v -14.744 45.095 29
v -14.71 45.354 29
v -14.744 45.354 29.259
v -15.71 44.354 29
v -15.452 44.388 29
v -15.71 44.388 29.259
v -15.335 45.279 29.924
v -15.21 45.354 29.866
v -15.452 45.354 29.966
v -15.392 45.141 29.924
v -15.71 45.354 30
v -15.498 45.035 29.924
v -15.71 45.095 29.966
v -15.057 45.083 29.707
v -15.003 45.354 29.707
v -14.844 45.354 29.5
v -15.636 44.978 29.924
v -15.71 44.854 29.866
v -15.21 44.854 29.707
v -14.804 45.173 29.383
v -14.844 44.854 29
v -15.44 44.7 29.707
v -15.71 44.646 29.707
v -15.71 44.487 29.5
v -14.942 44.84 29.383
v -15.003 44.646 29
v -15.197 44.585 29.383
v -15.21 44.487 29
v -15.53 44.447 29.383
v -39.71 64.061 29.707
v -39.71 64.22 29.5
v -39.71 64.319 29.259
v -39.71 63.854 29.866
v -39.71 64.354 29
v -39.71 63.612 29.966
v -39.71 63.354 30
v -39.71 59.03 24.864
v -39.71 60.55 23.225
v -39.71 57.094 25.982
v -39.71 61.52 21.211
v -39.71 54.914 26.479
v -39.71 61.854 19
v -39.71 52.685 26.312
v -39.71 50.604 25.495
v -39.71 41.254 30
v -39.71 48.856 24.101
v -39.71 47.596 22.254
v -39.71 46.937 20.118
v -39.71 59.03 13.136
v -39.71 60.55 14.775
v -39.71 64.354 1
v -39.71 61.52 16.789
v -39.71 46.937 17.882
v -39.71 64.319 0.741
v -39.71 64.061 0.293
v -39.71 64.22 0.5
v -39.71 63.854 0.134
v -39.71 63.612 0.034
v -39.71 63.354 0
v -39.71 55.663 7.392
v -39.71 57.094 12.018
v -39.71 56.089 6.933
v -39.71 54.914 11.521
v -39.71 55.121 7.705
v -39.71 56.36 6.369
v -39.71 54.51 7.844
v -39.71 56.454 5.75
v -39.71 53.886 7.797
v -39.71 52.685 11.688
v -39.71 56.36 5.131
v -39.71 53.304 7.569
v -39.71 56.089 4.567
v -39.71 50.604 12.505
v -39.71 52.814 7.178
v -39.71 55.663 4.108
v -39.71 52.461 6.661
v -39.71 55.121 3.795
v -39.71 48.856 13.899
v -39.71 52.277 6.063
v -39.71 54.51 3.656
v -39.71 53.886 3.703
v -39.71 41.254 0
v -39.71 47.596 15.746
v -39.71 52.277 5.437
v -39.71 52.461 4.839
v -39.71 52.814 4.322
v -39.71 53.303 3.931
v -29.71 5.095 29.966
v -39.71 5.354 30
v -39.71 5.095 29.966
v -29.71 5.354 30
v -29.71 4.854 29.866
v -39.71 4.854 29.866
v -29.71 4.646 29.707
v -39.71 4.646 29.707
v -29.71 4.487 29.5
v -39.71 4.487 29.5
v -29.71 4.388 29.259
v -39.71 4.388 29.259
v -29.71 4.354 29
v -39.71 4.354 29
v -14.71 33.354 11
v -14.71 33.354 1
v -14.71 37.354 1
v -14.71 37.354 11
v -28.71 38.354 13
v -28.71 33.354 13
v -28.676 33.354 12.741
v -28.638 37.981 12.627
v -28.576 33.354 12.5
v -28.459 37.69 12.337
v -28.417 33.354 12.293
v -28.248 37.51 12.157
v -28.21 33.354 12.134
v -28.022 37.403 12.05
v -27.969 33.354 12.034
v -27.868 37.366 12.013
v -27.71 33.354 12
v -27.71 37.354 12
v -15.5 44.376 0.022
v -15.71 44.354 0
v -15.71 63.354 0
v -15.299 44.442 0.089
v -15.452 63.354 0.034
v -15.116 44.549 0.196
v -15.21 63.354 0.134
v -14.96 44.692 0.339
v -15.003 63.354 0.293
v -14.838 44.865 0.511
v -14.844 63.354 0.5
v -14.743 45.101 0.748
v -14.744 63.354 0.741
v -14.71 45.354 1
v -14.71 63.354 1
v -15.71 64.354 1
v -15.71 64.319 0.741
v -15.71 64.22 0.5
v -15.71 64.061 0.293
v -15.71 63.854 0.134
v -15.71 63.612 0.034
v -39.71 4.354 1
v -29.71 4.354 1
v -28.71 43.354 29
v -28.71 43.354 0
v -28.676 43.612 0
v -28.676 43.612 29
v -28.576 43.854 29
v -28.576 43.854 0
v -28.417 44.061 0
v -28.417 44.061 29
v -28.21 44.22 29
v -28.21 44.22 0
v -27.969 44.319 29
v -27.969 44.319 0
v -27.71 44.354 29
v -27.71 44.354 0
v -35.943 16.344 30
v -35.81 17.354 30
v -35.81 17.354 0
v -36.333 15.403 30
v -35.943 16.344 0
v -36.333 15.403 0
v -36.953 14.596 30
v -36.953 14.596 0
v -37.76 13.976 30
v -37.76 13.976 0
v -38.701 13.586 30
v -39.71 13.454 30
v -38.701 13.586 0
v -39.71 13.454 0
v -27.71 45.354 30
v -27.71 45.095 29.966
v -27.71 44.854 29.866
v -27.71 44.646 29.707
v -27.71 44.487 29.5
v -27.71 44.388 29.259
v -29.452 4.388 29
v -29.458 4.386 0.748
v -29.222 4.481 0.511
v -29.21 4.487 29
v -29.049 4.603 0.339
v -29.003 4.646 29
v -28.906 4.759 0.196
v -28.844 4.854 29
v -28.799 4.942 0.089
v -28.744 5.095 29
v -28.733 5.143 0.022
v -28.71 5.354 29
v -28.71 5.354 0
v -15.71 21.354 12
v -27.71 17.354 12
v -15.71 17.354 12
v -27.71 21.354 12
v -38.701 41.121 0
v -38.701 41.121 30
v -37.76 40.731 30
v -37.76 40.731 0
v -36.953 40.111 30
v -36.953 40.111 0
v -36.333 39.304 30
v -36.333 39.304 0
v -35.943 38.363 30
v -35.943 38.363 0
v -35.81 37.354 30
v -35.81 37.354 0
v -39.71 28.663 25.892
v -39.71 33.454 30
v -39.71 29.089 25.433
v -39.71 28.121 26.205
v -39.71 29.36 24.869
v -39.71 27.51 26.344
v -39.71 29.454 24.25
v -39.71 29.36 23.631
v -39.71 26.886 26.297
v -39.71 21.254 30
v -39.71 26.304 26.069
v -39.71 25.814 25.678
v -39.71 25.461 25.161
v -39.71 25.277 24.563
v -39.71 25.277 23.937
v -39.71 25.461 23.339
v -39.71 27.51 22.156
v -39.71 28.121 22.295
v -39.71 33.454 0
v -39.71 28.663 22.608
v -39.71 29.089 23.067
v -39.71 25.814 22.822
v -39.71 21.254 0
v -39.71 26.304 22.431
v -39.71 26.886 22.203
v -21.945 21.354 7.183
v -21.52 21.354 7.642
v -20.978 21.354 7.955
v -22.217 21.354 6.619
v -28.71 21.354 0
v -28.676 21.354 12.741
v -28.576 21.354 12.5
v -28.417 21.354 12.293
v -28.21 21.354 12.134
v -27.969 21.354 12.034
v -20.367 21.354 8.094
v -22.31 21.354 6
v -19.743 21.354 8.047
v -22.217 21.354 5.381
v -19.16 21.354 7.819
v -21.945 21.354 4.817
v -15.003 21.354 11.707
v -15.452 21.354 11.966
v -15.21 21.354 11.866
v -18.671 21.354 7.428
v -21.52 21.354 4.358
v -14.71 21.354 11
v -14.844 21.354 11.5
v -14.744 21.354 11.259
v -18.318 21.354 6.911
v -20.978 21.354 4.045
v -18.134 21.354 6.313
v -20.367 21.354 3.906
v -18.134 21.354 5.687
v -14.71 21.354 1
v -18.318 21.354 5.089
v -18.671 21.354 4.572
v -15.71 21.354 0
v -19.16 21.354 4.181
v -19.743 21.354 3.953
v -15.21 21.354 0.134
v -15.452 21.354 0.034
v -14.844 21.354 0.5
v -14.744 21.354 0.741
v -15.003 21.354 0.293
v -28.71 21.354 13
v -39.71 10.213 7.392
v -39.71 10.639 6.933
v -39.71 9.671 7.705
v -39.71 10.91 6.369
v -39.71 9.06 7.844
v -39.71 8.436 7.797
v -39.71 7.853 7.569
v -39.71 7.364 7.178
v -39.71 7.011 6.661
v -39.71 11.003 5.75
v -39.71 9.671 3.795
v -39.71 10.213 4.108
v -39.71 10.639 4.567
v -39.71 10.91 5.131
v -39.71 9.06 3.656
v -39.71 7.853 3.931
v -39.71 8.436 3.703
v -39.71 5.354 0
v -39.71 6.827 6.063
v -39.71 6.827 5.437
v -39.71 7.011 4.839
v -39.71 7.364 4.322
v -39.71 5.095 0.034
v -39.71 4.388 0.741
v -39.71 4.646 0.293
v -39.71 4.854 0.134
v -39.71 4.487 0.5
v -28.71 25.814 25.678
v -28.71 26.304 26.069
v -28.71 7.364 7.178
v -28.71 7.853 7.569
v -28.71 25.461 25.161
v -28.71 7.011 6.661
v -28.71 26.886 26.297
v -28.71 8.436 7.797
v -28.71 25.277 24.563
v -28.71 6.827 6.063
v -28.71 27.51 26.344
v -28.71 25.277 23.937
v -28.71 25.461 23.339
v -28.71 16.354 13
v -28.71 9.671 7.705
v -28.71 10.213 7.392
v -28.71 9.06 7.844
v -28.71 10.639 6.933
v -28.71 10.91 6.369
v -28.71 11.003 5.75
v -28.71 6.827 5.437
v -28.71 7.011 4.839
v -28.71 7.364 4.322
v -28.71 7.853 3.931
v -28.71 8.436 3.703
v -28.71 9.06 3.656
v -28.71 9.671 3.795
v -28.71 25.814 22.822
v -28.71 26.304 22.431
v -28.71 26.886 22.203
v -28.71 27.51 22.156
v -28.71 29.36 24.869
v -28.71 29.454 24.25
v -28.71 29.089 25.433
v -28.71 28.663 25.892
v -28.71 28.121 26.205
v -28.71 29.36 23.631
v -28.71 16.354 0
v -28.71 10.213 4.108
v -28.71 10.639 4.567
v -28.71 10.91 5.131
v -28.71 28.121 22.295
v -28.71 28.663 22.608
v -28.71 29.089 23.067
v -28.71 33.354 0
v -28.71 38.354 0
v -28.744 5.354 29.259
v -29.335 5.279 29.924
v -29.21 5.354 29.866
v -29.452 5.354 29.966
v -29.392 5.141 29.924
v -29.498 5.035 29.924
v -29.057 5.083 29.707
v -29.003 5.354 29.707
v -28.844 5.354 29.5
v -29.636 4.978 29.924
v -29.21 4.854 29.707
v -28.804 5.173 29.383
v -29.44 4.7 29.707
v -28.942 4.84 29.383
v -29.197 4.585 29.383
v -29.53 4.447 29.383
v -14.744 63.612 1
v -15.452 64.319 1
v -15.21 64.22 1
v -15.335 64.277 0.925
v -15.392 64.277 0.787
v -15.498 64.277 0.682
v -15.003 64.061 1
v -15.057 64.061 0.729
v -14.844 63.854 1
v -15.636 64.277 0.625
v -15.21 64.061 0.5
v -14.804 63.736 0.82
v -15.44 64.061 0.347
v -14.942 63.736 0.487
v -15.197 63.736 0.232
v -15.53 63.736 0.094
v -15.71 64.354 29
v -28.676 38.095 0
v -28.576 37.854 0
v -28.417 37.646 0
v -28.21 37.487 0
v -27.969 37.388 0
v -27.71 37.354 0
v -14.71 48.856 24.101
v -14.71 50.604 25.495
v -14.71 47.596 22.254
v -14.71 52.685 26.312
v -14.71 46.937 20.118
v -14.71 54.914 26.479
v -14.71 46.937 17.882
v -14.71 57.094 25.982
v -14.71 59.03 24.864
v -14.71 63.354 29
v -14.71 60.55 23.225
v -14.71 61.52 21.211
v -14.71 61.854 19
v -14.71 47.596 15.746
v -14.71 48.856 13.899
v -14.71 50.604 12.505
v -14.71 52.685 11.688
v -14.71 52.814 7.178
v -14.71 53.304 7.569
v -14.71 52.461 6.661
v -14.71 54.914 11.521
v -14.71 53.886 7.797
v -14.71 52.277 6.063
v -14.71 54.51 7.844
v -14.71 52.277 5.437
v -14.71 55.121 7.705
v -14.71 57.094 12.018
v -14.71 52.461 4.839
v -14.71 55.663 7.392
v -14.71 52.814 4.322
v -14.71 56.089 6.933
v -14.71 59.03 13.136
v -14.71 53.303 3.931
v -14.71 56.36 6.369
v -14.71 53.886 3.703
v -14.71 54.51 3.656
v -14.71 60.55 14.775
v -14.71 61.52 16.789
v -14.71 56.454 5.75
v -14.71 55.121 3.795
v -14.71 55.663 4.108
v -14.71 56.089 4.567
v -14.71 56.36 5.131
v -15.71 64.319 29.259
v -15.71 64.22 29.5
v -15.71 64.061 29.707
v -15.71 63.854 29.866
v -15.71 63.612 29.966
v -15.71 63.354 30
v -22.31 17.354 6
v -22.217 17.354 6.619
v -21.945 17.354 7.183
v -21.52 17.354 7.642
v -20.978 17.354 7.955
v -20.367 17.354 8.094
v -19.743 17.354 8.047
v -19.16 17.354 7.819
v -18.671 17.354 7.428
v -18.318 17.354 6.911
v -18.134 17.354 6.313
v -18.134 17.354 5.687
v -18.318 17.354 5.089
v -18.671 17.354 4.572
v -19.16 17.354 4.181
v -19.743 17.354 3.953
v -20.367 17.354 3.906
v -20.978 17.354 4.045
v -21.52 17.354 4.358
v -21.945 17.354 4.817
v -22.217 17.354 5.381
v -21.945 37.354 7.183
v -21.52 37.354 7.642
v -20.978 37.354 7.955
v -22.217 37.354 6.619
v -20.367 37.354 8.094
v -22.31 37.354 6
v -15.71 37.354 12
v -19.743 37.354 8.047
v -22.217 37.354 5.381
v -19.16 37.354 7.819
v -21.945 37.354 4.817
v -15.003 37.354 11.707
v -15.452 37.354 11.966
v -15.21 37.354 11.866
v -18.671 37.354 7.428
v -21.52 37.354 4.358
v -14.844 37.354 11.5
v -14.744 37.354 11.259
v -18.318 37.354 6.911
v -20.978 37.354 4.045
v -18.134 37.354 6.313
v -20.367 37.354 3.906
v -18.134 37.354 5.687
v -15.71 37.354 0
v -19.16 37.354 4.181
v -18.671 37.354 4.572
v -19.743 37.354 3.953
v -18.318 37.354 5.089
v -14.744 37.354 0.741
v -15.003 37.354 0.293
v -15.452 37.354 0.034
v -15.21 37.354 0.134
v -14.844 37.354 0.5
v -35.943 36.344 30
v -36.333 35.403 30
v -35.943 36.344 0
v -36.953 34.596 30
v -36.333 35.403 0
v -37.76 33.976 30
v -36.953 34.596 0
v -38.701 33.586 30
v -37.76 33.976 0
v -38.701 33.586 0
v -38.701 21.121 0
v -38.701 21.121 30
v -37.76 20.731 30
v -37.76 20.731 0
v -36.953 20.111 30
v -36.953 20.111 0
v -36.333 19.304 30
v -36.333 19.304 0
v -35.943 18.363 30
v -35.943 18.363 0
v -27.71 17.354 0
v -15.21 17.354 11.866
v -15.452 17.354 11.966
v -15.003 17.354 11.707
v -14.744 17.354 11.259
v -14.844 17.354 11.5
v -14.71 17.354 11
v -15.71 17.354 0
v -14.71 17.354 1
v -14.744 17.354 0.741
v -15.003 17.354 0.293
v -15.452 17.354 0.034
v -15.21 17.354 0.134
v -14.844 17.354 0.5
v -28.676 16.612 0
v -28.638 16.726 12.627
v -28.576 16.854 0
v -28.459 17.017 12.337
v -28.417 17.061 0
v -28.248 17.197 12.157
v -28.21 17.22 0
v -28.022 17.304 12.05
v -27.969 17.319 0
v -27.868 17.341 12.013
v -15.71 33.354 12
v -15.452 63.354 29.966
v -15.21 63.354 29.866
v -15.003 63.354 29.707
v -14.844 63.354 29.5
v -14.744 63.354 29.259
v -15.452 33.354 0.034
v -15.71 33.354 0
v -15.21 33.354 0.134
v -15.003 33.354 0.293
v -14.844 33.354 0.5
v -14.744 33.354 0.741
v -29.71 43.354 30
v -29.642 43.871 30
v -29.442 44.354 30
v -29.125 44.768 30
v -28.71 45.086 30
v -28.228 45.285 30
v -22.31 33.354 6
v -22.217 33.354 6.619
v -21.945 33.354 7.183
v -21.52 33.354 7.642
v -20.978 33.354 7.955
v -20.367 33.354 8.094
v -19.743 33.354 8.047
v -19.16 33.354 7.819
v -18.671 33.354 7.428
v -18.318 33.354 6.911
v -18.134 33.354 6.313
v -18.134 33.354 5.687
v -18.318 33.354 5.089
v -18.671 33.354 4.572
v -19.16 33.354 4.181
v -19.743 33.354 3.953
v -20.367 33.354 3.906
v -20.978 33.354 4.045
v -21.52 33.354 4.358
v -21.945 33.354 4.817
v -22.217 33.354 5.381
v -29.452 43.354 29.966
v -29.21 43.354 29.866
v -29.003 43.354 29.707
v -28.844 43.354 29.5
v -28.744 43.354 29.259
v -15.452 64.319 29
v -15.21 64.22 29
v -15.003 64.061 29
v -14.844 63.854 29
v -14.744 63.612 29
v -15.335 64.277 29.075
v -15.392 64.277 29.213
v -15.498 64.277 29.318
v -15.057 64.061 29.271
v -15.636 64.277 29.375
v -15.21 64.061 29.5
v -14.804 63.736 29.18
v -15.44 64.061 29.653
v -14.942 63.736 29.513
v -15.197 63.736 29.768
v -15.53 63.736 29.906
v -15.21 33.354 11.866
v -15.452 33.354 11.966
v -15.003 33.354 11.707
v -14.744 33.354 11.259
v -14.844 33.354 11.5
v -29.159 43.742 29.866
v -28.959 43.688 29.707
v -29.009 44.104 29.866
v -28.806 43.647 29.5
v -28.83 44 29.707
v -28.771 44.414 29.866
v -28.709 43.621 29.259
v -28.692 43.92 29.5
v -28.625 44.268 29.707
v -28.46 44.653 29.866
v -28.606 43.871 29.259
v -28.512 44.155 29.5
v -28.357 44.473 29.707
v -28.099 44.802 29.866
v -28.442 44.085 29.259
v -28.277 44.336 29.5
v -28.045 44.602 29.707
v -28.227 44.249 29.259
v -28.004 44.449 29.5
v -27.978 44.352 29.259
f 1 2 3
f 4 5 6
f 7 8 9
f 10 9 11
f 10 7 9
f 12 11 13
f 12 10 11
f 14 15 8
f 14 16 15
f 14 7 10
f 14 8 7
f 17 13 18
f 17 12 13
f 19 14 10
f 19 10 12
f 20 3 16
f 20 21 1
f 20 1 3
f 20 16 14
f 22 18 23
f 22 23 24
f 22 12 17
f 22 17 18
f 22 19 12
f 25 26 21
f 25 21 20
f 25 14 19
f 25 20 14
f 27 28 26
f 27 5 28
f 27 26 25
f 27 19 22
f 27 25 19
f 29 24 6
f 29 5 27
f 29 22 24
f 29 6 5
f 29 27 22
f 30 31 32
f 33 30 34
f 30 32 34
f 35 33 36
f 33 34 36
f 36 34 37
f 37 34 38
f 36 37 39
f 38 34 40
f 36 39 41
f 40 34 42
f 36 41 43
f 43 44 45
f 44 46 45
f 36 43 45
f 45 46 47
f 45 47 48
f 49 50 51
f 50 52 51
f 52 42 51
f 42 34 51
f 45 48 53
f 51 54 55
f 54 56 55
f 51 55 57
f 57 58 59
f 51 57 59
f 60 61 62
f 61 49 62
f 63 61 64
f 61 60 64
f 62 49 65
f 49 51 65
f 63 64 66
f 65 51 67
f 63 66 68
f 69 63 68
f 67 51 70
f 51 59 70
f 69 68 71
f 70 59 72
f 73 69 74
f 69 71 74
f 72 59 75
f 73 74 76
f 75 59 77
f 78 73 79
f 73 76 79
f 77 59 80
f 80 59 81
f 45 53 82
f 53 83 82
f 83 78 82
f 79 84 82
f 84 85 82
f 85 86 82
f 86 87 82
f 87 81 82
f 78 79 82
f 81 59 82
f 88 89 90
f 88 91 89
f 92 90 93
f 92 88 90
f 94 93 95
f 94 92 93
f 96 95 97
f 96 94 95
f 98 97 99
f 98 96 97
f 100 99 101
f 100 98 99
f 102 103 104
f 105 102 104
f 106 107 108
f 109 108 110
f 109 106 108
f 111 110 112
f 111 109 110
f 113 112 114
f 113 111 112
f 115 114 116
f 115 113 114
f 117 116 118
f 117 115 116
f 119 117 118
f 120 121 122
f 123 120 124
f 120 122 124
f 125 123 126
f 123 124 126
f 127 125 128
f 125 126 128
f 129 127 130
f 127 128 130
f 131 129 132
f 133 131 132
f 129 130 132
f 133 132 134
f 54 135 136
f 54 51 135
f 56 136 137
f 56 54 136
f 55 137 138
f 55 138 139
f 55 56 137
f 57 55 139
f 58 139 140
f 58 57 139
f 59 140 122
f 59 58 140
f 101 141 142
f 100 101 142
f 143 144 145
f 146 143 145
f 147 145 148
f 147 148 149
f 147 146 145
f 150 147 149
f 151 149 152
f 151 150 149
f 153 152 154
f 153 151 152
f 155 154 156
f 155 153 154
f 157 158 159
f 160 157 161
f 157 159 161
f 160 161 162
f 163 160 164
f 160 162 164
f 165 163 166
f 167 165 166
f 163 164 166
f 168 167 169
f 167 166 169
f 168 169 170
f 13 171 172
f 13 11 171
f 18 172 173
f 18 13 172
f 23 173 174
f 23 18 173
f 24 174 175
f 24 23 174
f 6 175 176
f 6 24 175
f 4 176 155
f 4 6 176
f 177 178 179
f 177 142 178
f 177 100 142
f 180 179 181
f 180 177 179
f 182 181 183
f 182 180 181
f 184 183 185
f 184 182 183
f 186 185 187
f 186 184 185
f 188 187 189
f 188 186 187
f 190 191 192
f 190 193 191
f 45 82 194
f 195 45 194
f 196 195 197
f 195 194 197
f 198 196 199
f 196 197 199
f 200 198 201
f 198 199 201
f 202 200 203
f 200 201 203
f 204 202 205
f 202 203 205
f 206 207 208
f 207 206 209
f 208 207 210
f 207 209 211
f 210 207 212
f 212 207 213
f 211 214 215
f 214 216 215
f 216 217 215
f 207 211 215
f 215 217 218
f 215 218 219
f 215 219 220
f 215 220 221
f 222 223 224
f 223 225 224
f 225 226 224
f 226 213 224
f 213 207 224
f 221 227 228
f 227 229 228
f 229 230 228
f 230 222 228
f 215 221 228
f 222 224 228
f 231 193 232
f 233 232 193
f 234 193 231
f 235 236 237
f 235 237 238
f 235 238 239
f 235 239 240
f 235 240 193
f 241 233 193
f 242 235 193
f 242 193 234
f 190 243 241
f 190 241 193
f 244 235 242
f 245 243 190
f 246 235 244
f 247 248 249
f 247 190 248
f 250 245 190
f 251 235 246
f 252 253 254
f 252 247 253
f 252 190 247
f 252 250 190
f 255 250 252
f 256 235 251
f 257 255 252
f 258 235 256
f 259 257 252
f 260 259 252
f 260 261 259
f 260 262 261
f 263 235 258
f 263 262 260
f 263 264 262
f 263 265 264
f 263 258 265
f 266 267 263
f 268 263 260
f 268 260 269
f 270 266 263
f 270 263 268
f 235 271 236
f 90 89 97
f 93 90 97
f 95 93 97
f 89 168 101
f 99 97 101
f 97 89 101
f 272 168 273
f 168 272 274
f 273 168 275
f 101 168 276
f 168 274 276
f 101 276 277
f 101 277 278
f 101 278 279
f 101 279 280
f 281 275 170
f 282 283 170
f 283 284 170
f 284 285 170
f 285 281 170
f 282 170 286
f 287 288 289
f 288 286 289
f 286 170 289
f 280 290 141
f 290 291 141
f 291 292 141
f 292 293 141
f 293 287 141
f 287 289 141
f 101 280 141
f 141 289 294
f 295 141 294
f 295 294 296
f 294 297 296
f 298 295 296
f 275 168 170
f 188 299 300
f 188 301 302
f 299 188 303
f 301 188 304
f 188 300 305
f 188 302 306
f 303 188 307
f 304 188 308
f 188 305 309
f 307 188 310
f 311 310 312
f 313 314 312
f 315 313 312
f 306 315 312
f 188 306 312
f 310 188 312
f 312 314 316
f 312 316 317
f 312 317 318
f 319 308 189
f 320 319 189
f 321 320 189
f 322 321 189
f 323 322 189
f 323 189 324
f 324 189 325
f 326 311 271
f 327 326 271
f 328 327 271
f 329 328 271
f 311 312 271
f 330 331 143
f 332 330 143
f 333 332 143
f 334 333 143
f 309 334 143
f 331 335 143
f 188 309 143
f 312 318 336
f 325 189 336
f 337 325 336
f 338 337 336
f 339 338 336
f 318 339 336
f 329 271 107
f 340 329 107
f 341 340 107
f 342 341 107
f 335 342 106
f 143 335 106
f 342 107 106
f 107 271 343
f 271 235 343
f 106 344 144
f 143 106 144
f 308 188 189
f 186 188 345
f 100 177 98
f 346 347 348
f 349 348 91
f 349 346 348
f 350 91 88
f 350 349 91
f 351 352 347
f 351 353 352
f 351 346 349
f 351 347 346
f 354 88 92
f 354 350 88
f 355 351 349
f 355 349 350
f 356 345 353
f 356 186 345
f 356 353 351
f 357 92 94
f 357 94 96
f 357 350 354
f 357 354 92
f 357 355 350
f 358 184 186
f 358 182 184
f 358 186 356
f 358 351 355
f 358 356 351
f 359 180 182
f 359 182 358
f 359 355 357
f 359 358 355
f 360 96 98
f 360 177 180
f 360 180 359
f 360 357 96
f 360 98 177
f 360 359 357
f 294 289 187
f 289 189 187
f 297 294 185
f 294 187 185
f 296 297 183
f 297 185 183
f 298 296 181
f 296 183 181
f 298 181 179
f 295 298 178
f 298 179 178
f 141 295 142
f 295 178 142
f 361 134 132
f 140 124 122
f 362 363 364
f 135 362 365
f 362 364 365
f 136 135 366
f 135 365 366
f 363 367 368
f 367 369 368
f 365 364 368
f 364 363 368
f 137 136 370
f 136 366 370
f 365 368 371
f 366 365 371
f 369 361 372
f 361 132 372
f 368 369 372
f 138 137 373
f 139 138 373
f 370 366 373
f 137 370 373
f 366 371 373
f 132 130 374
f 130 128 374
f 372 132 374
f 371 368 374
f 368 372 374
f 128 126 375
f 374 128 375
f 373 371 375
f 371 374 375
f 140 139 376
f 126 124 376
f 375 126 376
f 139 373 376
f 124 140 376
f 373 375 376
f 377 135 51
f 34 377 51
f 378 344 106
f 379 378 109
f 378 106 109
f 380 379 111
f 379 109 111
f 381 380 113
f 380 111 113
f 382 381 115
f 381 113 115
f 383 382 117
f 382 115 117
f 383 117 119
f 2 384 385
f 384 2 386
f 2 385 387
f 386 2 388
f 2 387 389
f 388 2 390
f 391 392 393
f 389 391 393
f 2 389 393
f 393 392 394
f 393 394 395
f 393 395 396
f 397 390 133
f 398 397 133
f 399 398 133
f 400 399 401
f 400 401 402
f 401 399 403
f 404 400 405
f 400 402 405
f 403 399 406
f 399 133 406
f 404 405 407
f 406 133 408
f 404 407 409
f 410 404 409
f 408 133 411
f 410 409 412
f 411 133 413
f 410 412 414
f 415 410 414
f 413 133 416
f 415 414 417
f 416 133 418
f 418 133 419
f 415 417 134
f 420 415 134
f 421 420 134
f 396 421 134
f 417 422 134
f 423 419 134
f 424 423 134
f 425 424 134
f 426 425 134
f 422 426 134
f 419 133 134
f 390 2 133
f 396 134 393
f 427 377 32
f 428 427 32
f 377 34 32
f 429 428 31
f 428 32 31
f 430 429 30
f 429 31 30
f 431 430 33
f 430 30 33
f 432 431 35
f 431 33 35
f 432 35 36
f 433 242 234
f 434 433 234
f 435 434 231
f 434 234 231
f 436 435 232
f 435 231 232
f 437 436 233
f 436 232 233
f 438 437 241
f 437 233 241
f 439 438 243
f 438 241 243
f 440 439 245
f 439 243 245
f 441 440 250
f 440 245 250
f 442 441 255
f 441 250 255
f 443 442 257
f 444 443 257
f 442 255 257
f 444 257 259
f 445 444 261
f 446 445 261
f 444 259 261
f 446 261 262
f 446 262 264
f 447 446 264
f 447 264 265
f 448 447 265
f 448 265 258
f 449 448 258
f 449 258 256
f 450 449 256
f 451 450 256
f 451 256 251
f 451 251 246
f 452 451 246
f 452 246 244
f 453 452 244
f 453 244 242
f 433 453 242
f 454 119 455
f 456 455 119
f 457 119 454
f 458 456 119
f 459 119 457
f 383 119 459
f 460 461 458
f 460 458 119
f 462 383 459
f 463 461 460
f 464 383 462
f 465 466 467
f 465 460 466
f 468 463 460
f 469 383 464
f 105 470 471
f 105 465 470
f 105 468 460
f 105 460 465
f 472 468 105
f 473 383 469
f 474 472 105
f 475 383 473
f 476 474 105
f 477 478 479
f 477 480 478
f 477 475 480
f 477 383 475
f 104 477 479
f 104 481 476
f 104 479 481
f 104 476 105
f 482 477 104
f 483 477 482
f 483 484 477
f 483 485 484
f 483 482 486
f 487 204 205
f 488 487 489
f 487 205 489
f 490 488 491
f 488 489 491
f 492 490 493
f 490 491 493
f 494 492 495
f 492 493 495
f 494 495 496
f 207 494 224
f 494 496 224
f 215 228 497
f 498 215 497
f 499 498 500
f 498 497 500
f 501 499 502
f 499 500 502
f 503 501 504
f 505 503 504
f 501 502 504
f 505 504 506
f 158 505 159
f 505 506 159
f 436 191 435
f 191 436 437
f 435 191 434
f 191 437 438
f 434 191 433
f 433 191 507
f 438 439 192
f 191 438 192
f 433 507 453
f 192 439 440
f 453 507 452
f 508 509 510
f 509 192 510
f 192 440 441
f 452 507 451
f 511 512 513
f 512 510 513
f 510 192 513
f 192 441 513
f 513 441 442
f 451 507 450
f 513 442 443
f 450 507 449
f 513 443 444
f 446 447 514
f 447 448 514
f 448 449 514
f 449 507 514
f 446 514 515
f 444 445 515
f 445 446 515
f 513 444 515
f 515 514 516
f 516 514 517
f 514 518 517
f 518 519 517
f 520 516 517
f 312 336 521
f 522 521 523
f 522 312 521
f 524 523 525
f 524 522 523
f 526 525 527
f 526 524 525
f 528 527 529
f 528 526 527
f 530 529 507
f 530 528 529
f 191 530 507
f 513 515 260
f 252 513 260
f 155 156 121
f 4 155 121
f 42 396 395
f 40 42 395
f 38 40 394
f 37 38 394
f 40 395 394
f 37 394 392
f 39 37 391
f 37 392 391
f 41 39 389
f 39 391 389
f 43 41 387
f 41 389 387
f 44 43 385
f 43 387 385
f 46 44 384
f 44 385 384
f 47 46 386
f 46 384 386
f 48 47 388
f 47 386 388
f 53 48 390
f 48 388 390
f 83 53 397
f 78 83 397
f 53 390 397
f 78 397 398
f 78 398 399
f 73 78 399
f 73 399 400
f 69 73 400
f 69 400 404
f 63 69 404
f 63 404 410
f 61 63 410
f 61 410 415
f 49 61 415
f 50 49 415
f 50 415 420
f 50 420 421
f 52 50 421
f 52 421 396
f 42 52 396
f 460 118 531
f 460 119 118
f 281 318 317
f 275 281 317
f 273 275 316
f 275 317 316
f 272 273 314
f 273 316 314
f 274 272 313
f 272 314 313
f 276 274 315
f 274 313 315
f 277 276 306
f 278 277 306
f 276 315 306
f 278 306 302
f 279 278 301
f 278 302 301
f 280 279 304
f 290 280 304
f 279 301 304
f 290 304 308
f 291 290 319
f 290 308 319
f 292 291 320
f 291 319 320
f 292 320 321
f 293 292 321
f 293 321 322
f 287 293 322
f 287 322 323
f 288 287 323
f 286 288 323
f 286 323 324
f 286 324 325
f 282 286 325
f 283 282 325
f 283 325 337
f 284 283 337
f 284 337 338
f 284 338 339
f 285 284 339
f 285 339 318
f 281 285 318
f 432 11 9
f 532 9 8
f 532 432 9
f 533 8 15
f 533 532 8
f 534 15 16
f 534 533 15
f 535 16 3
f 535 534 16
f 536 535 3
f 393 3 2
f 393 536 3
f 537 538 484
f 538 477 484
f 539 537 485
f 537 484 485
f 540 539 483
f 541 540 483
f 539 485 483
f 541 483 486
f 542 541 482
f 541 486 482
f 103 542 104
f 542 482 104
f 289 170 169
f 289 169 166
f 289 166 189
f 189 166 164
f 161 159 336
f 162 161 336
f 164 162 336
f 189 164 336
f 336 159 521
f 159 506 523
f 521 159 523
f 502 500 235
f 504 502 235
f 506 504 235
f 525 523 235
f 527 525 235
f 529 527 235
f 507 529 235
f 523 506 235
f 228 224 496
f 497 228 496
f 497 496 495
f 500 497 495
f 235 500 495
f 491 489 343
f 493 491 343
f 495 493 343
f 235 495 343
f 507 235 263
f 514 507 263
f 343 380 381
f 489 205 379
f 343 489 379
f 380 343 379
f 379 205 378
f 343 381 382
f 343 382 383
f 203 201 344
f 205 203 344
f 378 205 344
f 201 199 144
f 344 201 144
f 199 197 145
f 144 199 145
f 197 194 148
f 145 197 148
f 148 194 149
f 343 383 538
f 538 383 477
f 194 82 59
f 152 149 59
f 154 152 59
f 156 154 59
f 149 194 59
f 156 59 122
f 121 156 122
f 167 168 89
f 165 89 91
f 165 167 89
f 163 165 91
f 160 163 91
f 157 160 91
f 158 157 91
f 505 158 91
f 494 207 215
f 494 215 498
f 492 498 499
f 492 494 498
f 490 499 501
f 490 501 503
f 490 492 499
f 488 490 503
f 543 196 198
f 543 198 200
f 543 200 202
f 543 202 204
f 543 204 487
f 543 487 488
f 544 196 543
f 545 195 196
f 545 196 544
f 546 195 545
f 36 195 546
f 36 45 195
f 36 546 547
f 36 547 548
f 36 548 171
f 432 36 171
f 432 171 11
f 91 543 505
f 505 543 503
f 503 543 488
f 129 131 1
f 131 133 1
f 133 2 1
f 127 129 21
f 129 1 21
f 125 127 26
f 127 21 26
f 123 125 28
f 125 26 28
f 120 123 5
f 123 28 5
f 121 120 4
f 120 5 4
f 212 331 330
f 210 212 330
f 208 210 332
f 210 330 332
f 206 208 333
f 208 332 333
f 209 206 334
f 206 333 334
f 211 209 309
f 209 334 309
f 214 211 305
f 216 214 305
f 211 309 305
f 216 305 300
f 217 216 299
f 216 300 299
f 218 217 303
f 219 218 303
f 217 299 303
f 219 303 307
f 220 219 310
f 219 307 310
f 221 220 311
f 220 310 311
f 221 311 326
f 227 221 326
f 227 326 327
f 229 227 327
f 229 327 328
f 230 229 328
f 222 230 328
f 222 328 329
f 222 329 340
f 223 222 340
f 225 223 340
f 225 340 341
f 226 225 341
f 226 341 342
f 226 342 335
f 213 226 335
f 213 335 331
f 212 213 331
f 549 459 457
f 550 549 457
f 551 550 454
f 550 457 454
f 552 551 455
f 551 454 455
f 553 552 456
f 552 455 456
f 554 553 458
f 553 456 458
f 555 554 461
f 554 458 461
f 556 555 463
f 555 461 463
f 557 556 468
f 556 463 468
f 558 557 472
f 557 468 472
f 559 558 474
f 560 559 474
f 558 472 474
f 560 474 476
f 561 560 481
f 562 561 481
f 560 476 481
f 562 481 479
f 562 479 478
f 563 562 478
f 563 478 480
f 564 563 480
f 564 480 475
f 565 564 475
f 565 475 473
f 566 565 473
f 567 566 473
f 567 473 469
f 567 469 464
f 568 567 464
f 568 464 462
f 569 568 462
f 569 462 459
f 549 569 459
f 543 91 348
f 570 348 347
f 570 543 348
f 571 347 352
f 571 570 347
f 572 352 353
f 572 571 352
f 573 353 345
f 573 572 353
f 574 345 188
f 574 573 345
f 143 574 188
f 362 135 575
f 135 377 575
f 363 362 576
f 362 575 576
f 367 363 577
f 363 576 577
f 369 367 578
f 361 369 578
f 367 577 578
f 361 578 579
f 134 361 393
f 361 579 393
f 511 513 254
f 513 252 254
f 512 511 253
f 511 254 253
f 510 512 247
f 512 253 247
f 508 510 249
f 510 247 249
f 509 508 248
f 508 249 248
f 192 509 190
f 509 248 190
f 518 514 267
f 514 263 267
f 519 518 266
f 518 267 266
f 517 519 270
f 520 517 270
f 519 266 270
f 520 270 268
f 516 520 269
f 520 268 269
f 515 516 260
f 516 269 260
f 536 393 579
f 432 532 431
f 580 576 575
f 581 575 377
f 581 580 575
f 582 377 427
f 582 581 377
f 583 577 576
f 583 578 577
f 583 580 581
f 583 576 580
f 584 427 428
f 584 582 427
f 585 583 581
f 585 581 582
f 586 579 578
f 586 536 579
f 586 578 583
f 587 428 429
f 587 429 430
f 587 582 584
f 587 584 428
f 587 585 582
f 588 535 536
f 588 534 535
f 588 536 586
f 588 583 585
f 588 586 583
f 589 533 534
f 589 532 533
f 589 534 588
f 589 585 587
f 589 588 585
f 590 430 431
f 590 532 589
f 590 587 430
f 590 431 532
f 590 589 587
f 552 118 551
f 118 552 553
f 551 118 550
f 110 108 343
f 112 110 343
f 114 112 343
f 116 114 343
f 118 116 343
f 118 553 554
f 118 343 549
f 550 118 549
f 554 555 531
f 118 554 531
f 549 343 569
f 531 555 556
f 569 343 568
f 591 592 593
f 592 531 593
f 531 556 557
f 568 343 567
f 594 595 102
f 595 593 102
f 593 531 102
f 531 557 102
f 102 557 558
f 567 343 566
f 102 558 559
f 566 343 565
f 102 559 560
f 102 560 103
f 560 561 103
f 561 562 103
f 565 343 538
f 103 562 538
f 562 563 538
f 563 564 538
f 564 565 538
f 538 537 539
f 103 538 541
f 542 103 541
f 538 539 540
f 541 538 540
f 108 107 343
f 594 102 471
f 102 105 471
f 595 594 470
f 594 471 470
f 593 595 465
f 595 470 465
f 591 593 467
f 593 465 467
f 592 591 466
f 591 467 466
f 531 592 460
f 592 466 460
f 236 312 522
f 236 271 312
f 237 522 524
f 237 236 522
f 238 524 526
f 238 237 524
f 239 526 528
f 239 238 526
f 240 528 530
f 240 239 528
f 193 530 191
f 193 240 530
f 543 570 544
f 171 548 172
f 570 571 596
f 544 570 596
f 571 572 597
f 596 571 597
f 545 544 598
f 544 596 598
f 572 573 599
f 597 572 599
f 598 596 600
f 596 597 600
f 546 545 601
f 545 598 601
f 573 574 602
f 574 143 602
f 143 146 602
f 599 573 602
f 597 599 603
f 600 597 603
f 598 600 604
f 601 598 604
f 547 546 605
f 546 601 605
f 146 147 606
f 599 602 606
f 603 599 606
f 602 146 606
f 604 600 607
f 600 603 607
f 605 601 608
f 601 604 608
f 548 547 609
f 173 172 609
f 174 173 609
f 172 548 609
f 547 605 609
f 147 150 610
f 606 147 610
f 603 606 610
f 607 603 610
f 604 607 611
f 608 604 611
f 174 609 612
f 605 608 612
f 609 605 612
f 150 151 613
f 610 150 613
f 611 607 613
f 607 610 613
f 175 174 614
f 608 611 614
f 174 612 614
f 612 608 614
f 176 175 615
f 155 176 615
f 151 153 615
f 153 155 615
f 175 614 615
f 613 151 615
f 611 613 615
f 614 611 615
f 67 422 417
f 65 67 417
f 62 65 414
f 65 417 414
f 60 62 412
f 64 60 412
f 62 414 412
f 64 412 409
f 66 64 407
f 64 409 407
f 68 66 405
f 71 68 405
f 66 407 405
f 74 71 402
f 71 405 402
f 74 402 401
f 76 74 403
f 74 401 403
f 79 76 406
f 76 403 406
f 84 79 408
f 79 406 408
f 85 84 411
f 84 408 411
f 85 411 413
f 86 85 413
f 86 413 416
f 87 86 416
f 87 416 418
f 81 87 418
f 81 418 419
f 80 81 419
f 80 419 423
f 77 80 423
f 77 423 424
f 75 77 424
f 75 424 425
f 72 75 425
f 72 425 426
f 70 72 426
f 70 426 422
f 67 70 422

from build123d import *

# Parameters (mm, degrees)
F0_W     = 14
F0_H     = 20
F1_DEPTH = 30
F0_H_2   = 4
F2_DEPTH = 12
F3_R     = 7.5
F3_R_2   = 2.1
F4_DEPTH = 25.001
F5_R     = 2.1
F6_DEPTH = 25
F7_R     = 1


with BuildPart() as f1:
    # F0 (on Top) → F1 (new body)
    with BuildSketch(Plane.XY):
        with BuildLine():
            Line((-28.710388, 64.3535), (-39.710388, 64.3535))
            Line((-39.710388, 64.3535), (-39.710388, 41.2535))
            ThreePointArc((-39.710388, 41.2535), (-36.952671, 40.111216), (-35.810388, 37.3535))
            ThreePointArc((-35.810388, 37.3535), (-36.952671, 34.595783), (-39.710388, 33.4535))
            Line((-39.710388, 33.4535), (-39.710388, 21.2535))
            ThreePointArc((-39.710388, 21.2535), (-36.952671, 20.111216), (-35.810388, 17.3535))
            ThreePointArc((-35.810388, 17.3535), (-36.952671, 14.595783), (-39.710388, 13.4535))
            Line((-39.710388, 13.4535), (-39.710388, 4.3535))
            Line((-39.710388, 4.3535), (-28.710388, 4.3535))
            Line((-28.710388, 4.3535), (-28.710388, 17.3535))
            Line((-28.710388, 17.3535), (-28.710388, 21.3535))
            Line((-28.710388, 21.3535), (-28.710388, 33.3535))
            Line((-28.710388, 33.3535), (-28.710388, 37.3535))
            Line((-28.710388, 37.3535), (-28.710388, 44.3535))
            Line((-28.710388, 44.3535), (-28.710388, 64.3535))
        make_face()
        with Locations((-21.710388, 54.3535)):
            Rectangle(F0_W, F0_H)
    extrude(amount=F1_DEPTH)

    # F0 (on Top) → F2 (join)
    with BuildSketch(Plane.XY):
        with Locations((-21.710388, 35.3535)):
            Rectangle(F0_W, F0_H_2)
        with Locations((-21.710388, 19.3535)):
            Rectangle(F0_W, F0_H_2)
    extrude(amount=F2_DEPTH)

    # F3 (on face) → F4 (cut, through all)
    with BuildSketch(Plane.YZ.offset(-14.710388)):
        with Locations((54.3535, 19)):
            Circle(F3_R)
        with Locations((54.3535, 5.75)):
            Circle(F3_R_2)
        with Locations((27.3535, 24.25)):
            Circle(F3_R_2)
        with Locations((8.9035, 5.75)):
            Circle(F3_R_2)
    extrude(amount=-F4_DEPTH, mode=Mode.SUBTRACT)

    # F5 (on face) → F6 (cut)
    with BuildSketch(Plane(origin=(0, 37.3535, 0), x_dir=(-1, 0, 0), z_dir=(0, 1, 0))):
        with Locations((20.210388, 6)):
            Circle(F5_R)
    extrude(amount=-F6_DEPTH, mode=Mode.SUBTRACT)

    # F7
    f7_edges = [f1.edges().sort_by_distance(p)[0] for p in [
        (-14.710388, 35.3535, 12),
        (-14.710388, 19.3535, 12),
        (-14.710388, 19.3535, 0),
        (-14.710388, 54.3535, 0),
        (-14.710388, 44.3535, 15),
        (-14.710388, 54.3535, 30),
        (-14.710388, 64.3535, 15),
        (-27.210388, 64.3535, 0),
        (-27.210388, 64.3535, 30),
        (-34.210388, 4.3535, 0),
        (-28.710388, 4.3535, 15),
        (-28.710388, 24.3535, 30),
        (-21.710388, 44.3535, 30),
        (-28.710388, 19.3535, 12),
        (-28.710388, 35.3535, 12),
        (-28.710388, 37.3535, 6),
        (-28.710388, 17.3535, 6),
        (-34.210388, 4.3535, 30),
        (-28.710388, 44.3535, 15),
        (-14.710388, 35.3535, 0),
    ]]
    fillet(f7_edges, radius=F7_R)


solid = f1.part
